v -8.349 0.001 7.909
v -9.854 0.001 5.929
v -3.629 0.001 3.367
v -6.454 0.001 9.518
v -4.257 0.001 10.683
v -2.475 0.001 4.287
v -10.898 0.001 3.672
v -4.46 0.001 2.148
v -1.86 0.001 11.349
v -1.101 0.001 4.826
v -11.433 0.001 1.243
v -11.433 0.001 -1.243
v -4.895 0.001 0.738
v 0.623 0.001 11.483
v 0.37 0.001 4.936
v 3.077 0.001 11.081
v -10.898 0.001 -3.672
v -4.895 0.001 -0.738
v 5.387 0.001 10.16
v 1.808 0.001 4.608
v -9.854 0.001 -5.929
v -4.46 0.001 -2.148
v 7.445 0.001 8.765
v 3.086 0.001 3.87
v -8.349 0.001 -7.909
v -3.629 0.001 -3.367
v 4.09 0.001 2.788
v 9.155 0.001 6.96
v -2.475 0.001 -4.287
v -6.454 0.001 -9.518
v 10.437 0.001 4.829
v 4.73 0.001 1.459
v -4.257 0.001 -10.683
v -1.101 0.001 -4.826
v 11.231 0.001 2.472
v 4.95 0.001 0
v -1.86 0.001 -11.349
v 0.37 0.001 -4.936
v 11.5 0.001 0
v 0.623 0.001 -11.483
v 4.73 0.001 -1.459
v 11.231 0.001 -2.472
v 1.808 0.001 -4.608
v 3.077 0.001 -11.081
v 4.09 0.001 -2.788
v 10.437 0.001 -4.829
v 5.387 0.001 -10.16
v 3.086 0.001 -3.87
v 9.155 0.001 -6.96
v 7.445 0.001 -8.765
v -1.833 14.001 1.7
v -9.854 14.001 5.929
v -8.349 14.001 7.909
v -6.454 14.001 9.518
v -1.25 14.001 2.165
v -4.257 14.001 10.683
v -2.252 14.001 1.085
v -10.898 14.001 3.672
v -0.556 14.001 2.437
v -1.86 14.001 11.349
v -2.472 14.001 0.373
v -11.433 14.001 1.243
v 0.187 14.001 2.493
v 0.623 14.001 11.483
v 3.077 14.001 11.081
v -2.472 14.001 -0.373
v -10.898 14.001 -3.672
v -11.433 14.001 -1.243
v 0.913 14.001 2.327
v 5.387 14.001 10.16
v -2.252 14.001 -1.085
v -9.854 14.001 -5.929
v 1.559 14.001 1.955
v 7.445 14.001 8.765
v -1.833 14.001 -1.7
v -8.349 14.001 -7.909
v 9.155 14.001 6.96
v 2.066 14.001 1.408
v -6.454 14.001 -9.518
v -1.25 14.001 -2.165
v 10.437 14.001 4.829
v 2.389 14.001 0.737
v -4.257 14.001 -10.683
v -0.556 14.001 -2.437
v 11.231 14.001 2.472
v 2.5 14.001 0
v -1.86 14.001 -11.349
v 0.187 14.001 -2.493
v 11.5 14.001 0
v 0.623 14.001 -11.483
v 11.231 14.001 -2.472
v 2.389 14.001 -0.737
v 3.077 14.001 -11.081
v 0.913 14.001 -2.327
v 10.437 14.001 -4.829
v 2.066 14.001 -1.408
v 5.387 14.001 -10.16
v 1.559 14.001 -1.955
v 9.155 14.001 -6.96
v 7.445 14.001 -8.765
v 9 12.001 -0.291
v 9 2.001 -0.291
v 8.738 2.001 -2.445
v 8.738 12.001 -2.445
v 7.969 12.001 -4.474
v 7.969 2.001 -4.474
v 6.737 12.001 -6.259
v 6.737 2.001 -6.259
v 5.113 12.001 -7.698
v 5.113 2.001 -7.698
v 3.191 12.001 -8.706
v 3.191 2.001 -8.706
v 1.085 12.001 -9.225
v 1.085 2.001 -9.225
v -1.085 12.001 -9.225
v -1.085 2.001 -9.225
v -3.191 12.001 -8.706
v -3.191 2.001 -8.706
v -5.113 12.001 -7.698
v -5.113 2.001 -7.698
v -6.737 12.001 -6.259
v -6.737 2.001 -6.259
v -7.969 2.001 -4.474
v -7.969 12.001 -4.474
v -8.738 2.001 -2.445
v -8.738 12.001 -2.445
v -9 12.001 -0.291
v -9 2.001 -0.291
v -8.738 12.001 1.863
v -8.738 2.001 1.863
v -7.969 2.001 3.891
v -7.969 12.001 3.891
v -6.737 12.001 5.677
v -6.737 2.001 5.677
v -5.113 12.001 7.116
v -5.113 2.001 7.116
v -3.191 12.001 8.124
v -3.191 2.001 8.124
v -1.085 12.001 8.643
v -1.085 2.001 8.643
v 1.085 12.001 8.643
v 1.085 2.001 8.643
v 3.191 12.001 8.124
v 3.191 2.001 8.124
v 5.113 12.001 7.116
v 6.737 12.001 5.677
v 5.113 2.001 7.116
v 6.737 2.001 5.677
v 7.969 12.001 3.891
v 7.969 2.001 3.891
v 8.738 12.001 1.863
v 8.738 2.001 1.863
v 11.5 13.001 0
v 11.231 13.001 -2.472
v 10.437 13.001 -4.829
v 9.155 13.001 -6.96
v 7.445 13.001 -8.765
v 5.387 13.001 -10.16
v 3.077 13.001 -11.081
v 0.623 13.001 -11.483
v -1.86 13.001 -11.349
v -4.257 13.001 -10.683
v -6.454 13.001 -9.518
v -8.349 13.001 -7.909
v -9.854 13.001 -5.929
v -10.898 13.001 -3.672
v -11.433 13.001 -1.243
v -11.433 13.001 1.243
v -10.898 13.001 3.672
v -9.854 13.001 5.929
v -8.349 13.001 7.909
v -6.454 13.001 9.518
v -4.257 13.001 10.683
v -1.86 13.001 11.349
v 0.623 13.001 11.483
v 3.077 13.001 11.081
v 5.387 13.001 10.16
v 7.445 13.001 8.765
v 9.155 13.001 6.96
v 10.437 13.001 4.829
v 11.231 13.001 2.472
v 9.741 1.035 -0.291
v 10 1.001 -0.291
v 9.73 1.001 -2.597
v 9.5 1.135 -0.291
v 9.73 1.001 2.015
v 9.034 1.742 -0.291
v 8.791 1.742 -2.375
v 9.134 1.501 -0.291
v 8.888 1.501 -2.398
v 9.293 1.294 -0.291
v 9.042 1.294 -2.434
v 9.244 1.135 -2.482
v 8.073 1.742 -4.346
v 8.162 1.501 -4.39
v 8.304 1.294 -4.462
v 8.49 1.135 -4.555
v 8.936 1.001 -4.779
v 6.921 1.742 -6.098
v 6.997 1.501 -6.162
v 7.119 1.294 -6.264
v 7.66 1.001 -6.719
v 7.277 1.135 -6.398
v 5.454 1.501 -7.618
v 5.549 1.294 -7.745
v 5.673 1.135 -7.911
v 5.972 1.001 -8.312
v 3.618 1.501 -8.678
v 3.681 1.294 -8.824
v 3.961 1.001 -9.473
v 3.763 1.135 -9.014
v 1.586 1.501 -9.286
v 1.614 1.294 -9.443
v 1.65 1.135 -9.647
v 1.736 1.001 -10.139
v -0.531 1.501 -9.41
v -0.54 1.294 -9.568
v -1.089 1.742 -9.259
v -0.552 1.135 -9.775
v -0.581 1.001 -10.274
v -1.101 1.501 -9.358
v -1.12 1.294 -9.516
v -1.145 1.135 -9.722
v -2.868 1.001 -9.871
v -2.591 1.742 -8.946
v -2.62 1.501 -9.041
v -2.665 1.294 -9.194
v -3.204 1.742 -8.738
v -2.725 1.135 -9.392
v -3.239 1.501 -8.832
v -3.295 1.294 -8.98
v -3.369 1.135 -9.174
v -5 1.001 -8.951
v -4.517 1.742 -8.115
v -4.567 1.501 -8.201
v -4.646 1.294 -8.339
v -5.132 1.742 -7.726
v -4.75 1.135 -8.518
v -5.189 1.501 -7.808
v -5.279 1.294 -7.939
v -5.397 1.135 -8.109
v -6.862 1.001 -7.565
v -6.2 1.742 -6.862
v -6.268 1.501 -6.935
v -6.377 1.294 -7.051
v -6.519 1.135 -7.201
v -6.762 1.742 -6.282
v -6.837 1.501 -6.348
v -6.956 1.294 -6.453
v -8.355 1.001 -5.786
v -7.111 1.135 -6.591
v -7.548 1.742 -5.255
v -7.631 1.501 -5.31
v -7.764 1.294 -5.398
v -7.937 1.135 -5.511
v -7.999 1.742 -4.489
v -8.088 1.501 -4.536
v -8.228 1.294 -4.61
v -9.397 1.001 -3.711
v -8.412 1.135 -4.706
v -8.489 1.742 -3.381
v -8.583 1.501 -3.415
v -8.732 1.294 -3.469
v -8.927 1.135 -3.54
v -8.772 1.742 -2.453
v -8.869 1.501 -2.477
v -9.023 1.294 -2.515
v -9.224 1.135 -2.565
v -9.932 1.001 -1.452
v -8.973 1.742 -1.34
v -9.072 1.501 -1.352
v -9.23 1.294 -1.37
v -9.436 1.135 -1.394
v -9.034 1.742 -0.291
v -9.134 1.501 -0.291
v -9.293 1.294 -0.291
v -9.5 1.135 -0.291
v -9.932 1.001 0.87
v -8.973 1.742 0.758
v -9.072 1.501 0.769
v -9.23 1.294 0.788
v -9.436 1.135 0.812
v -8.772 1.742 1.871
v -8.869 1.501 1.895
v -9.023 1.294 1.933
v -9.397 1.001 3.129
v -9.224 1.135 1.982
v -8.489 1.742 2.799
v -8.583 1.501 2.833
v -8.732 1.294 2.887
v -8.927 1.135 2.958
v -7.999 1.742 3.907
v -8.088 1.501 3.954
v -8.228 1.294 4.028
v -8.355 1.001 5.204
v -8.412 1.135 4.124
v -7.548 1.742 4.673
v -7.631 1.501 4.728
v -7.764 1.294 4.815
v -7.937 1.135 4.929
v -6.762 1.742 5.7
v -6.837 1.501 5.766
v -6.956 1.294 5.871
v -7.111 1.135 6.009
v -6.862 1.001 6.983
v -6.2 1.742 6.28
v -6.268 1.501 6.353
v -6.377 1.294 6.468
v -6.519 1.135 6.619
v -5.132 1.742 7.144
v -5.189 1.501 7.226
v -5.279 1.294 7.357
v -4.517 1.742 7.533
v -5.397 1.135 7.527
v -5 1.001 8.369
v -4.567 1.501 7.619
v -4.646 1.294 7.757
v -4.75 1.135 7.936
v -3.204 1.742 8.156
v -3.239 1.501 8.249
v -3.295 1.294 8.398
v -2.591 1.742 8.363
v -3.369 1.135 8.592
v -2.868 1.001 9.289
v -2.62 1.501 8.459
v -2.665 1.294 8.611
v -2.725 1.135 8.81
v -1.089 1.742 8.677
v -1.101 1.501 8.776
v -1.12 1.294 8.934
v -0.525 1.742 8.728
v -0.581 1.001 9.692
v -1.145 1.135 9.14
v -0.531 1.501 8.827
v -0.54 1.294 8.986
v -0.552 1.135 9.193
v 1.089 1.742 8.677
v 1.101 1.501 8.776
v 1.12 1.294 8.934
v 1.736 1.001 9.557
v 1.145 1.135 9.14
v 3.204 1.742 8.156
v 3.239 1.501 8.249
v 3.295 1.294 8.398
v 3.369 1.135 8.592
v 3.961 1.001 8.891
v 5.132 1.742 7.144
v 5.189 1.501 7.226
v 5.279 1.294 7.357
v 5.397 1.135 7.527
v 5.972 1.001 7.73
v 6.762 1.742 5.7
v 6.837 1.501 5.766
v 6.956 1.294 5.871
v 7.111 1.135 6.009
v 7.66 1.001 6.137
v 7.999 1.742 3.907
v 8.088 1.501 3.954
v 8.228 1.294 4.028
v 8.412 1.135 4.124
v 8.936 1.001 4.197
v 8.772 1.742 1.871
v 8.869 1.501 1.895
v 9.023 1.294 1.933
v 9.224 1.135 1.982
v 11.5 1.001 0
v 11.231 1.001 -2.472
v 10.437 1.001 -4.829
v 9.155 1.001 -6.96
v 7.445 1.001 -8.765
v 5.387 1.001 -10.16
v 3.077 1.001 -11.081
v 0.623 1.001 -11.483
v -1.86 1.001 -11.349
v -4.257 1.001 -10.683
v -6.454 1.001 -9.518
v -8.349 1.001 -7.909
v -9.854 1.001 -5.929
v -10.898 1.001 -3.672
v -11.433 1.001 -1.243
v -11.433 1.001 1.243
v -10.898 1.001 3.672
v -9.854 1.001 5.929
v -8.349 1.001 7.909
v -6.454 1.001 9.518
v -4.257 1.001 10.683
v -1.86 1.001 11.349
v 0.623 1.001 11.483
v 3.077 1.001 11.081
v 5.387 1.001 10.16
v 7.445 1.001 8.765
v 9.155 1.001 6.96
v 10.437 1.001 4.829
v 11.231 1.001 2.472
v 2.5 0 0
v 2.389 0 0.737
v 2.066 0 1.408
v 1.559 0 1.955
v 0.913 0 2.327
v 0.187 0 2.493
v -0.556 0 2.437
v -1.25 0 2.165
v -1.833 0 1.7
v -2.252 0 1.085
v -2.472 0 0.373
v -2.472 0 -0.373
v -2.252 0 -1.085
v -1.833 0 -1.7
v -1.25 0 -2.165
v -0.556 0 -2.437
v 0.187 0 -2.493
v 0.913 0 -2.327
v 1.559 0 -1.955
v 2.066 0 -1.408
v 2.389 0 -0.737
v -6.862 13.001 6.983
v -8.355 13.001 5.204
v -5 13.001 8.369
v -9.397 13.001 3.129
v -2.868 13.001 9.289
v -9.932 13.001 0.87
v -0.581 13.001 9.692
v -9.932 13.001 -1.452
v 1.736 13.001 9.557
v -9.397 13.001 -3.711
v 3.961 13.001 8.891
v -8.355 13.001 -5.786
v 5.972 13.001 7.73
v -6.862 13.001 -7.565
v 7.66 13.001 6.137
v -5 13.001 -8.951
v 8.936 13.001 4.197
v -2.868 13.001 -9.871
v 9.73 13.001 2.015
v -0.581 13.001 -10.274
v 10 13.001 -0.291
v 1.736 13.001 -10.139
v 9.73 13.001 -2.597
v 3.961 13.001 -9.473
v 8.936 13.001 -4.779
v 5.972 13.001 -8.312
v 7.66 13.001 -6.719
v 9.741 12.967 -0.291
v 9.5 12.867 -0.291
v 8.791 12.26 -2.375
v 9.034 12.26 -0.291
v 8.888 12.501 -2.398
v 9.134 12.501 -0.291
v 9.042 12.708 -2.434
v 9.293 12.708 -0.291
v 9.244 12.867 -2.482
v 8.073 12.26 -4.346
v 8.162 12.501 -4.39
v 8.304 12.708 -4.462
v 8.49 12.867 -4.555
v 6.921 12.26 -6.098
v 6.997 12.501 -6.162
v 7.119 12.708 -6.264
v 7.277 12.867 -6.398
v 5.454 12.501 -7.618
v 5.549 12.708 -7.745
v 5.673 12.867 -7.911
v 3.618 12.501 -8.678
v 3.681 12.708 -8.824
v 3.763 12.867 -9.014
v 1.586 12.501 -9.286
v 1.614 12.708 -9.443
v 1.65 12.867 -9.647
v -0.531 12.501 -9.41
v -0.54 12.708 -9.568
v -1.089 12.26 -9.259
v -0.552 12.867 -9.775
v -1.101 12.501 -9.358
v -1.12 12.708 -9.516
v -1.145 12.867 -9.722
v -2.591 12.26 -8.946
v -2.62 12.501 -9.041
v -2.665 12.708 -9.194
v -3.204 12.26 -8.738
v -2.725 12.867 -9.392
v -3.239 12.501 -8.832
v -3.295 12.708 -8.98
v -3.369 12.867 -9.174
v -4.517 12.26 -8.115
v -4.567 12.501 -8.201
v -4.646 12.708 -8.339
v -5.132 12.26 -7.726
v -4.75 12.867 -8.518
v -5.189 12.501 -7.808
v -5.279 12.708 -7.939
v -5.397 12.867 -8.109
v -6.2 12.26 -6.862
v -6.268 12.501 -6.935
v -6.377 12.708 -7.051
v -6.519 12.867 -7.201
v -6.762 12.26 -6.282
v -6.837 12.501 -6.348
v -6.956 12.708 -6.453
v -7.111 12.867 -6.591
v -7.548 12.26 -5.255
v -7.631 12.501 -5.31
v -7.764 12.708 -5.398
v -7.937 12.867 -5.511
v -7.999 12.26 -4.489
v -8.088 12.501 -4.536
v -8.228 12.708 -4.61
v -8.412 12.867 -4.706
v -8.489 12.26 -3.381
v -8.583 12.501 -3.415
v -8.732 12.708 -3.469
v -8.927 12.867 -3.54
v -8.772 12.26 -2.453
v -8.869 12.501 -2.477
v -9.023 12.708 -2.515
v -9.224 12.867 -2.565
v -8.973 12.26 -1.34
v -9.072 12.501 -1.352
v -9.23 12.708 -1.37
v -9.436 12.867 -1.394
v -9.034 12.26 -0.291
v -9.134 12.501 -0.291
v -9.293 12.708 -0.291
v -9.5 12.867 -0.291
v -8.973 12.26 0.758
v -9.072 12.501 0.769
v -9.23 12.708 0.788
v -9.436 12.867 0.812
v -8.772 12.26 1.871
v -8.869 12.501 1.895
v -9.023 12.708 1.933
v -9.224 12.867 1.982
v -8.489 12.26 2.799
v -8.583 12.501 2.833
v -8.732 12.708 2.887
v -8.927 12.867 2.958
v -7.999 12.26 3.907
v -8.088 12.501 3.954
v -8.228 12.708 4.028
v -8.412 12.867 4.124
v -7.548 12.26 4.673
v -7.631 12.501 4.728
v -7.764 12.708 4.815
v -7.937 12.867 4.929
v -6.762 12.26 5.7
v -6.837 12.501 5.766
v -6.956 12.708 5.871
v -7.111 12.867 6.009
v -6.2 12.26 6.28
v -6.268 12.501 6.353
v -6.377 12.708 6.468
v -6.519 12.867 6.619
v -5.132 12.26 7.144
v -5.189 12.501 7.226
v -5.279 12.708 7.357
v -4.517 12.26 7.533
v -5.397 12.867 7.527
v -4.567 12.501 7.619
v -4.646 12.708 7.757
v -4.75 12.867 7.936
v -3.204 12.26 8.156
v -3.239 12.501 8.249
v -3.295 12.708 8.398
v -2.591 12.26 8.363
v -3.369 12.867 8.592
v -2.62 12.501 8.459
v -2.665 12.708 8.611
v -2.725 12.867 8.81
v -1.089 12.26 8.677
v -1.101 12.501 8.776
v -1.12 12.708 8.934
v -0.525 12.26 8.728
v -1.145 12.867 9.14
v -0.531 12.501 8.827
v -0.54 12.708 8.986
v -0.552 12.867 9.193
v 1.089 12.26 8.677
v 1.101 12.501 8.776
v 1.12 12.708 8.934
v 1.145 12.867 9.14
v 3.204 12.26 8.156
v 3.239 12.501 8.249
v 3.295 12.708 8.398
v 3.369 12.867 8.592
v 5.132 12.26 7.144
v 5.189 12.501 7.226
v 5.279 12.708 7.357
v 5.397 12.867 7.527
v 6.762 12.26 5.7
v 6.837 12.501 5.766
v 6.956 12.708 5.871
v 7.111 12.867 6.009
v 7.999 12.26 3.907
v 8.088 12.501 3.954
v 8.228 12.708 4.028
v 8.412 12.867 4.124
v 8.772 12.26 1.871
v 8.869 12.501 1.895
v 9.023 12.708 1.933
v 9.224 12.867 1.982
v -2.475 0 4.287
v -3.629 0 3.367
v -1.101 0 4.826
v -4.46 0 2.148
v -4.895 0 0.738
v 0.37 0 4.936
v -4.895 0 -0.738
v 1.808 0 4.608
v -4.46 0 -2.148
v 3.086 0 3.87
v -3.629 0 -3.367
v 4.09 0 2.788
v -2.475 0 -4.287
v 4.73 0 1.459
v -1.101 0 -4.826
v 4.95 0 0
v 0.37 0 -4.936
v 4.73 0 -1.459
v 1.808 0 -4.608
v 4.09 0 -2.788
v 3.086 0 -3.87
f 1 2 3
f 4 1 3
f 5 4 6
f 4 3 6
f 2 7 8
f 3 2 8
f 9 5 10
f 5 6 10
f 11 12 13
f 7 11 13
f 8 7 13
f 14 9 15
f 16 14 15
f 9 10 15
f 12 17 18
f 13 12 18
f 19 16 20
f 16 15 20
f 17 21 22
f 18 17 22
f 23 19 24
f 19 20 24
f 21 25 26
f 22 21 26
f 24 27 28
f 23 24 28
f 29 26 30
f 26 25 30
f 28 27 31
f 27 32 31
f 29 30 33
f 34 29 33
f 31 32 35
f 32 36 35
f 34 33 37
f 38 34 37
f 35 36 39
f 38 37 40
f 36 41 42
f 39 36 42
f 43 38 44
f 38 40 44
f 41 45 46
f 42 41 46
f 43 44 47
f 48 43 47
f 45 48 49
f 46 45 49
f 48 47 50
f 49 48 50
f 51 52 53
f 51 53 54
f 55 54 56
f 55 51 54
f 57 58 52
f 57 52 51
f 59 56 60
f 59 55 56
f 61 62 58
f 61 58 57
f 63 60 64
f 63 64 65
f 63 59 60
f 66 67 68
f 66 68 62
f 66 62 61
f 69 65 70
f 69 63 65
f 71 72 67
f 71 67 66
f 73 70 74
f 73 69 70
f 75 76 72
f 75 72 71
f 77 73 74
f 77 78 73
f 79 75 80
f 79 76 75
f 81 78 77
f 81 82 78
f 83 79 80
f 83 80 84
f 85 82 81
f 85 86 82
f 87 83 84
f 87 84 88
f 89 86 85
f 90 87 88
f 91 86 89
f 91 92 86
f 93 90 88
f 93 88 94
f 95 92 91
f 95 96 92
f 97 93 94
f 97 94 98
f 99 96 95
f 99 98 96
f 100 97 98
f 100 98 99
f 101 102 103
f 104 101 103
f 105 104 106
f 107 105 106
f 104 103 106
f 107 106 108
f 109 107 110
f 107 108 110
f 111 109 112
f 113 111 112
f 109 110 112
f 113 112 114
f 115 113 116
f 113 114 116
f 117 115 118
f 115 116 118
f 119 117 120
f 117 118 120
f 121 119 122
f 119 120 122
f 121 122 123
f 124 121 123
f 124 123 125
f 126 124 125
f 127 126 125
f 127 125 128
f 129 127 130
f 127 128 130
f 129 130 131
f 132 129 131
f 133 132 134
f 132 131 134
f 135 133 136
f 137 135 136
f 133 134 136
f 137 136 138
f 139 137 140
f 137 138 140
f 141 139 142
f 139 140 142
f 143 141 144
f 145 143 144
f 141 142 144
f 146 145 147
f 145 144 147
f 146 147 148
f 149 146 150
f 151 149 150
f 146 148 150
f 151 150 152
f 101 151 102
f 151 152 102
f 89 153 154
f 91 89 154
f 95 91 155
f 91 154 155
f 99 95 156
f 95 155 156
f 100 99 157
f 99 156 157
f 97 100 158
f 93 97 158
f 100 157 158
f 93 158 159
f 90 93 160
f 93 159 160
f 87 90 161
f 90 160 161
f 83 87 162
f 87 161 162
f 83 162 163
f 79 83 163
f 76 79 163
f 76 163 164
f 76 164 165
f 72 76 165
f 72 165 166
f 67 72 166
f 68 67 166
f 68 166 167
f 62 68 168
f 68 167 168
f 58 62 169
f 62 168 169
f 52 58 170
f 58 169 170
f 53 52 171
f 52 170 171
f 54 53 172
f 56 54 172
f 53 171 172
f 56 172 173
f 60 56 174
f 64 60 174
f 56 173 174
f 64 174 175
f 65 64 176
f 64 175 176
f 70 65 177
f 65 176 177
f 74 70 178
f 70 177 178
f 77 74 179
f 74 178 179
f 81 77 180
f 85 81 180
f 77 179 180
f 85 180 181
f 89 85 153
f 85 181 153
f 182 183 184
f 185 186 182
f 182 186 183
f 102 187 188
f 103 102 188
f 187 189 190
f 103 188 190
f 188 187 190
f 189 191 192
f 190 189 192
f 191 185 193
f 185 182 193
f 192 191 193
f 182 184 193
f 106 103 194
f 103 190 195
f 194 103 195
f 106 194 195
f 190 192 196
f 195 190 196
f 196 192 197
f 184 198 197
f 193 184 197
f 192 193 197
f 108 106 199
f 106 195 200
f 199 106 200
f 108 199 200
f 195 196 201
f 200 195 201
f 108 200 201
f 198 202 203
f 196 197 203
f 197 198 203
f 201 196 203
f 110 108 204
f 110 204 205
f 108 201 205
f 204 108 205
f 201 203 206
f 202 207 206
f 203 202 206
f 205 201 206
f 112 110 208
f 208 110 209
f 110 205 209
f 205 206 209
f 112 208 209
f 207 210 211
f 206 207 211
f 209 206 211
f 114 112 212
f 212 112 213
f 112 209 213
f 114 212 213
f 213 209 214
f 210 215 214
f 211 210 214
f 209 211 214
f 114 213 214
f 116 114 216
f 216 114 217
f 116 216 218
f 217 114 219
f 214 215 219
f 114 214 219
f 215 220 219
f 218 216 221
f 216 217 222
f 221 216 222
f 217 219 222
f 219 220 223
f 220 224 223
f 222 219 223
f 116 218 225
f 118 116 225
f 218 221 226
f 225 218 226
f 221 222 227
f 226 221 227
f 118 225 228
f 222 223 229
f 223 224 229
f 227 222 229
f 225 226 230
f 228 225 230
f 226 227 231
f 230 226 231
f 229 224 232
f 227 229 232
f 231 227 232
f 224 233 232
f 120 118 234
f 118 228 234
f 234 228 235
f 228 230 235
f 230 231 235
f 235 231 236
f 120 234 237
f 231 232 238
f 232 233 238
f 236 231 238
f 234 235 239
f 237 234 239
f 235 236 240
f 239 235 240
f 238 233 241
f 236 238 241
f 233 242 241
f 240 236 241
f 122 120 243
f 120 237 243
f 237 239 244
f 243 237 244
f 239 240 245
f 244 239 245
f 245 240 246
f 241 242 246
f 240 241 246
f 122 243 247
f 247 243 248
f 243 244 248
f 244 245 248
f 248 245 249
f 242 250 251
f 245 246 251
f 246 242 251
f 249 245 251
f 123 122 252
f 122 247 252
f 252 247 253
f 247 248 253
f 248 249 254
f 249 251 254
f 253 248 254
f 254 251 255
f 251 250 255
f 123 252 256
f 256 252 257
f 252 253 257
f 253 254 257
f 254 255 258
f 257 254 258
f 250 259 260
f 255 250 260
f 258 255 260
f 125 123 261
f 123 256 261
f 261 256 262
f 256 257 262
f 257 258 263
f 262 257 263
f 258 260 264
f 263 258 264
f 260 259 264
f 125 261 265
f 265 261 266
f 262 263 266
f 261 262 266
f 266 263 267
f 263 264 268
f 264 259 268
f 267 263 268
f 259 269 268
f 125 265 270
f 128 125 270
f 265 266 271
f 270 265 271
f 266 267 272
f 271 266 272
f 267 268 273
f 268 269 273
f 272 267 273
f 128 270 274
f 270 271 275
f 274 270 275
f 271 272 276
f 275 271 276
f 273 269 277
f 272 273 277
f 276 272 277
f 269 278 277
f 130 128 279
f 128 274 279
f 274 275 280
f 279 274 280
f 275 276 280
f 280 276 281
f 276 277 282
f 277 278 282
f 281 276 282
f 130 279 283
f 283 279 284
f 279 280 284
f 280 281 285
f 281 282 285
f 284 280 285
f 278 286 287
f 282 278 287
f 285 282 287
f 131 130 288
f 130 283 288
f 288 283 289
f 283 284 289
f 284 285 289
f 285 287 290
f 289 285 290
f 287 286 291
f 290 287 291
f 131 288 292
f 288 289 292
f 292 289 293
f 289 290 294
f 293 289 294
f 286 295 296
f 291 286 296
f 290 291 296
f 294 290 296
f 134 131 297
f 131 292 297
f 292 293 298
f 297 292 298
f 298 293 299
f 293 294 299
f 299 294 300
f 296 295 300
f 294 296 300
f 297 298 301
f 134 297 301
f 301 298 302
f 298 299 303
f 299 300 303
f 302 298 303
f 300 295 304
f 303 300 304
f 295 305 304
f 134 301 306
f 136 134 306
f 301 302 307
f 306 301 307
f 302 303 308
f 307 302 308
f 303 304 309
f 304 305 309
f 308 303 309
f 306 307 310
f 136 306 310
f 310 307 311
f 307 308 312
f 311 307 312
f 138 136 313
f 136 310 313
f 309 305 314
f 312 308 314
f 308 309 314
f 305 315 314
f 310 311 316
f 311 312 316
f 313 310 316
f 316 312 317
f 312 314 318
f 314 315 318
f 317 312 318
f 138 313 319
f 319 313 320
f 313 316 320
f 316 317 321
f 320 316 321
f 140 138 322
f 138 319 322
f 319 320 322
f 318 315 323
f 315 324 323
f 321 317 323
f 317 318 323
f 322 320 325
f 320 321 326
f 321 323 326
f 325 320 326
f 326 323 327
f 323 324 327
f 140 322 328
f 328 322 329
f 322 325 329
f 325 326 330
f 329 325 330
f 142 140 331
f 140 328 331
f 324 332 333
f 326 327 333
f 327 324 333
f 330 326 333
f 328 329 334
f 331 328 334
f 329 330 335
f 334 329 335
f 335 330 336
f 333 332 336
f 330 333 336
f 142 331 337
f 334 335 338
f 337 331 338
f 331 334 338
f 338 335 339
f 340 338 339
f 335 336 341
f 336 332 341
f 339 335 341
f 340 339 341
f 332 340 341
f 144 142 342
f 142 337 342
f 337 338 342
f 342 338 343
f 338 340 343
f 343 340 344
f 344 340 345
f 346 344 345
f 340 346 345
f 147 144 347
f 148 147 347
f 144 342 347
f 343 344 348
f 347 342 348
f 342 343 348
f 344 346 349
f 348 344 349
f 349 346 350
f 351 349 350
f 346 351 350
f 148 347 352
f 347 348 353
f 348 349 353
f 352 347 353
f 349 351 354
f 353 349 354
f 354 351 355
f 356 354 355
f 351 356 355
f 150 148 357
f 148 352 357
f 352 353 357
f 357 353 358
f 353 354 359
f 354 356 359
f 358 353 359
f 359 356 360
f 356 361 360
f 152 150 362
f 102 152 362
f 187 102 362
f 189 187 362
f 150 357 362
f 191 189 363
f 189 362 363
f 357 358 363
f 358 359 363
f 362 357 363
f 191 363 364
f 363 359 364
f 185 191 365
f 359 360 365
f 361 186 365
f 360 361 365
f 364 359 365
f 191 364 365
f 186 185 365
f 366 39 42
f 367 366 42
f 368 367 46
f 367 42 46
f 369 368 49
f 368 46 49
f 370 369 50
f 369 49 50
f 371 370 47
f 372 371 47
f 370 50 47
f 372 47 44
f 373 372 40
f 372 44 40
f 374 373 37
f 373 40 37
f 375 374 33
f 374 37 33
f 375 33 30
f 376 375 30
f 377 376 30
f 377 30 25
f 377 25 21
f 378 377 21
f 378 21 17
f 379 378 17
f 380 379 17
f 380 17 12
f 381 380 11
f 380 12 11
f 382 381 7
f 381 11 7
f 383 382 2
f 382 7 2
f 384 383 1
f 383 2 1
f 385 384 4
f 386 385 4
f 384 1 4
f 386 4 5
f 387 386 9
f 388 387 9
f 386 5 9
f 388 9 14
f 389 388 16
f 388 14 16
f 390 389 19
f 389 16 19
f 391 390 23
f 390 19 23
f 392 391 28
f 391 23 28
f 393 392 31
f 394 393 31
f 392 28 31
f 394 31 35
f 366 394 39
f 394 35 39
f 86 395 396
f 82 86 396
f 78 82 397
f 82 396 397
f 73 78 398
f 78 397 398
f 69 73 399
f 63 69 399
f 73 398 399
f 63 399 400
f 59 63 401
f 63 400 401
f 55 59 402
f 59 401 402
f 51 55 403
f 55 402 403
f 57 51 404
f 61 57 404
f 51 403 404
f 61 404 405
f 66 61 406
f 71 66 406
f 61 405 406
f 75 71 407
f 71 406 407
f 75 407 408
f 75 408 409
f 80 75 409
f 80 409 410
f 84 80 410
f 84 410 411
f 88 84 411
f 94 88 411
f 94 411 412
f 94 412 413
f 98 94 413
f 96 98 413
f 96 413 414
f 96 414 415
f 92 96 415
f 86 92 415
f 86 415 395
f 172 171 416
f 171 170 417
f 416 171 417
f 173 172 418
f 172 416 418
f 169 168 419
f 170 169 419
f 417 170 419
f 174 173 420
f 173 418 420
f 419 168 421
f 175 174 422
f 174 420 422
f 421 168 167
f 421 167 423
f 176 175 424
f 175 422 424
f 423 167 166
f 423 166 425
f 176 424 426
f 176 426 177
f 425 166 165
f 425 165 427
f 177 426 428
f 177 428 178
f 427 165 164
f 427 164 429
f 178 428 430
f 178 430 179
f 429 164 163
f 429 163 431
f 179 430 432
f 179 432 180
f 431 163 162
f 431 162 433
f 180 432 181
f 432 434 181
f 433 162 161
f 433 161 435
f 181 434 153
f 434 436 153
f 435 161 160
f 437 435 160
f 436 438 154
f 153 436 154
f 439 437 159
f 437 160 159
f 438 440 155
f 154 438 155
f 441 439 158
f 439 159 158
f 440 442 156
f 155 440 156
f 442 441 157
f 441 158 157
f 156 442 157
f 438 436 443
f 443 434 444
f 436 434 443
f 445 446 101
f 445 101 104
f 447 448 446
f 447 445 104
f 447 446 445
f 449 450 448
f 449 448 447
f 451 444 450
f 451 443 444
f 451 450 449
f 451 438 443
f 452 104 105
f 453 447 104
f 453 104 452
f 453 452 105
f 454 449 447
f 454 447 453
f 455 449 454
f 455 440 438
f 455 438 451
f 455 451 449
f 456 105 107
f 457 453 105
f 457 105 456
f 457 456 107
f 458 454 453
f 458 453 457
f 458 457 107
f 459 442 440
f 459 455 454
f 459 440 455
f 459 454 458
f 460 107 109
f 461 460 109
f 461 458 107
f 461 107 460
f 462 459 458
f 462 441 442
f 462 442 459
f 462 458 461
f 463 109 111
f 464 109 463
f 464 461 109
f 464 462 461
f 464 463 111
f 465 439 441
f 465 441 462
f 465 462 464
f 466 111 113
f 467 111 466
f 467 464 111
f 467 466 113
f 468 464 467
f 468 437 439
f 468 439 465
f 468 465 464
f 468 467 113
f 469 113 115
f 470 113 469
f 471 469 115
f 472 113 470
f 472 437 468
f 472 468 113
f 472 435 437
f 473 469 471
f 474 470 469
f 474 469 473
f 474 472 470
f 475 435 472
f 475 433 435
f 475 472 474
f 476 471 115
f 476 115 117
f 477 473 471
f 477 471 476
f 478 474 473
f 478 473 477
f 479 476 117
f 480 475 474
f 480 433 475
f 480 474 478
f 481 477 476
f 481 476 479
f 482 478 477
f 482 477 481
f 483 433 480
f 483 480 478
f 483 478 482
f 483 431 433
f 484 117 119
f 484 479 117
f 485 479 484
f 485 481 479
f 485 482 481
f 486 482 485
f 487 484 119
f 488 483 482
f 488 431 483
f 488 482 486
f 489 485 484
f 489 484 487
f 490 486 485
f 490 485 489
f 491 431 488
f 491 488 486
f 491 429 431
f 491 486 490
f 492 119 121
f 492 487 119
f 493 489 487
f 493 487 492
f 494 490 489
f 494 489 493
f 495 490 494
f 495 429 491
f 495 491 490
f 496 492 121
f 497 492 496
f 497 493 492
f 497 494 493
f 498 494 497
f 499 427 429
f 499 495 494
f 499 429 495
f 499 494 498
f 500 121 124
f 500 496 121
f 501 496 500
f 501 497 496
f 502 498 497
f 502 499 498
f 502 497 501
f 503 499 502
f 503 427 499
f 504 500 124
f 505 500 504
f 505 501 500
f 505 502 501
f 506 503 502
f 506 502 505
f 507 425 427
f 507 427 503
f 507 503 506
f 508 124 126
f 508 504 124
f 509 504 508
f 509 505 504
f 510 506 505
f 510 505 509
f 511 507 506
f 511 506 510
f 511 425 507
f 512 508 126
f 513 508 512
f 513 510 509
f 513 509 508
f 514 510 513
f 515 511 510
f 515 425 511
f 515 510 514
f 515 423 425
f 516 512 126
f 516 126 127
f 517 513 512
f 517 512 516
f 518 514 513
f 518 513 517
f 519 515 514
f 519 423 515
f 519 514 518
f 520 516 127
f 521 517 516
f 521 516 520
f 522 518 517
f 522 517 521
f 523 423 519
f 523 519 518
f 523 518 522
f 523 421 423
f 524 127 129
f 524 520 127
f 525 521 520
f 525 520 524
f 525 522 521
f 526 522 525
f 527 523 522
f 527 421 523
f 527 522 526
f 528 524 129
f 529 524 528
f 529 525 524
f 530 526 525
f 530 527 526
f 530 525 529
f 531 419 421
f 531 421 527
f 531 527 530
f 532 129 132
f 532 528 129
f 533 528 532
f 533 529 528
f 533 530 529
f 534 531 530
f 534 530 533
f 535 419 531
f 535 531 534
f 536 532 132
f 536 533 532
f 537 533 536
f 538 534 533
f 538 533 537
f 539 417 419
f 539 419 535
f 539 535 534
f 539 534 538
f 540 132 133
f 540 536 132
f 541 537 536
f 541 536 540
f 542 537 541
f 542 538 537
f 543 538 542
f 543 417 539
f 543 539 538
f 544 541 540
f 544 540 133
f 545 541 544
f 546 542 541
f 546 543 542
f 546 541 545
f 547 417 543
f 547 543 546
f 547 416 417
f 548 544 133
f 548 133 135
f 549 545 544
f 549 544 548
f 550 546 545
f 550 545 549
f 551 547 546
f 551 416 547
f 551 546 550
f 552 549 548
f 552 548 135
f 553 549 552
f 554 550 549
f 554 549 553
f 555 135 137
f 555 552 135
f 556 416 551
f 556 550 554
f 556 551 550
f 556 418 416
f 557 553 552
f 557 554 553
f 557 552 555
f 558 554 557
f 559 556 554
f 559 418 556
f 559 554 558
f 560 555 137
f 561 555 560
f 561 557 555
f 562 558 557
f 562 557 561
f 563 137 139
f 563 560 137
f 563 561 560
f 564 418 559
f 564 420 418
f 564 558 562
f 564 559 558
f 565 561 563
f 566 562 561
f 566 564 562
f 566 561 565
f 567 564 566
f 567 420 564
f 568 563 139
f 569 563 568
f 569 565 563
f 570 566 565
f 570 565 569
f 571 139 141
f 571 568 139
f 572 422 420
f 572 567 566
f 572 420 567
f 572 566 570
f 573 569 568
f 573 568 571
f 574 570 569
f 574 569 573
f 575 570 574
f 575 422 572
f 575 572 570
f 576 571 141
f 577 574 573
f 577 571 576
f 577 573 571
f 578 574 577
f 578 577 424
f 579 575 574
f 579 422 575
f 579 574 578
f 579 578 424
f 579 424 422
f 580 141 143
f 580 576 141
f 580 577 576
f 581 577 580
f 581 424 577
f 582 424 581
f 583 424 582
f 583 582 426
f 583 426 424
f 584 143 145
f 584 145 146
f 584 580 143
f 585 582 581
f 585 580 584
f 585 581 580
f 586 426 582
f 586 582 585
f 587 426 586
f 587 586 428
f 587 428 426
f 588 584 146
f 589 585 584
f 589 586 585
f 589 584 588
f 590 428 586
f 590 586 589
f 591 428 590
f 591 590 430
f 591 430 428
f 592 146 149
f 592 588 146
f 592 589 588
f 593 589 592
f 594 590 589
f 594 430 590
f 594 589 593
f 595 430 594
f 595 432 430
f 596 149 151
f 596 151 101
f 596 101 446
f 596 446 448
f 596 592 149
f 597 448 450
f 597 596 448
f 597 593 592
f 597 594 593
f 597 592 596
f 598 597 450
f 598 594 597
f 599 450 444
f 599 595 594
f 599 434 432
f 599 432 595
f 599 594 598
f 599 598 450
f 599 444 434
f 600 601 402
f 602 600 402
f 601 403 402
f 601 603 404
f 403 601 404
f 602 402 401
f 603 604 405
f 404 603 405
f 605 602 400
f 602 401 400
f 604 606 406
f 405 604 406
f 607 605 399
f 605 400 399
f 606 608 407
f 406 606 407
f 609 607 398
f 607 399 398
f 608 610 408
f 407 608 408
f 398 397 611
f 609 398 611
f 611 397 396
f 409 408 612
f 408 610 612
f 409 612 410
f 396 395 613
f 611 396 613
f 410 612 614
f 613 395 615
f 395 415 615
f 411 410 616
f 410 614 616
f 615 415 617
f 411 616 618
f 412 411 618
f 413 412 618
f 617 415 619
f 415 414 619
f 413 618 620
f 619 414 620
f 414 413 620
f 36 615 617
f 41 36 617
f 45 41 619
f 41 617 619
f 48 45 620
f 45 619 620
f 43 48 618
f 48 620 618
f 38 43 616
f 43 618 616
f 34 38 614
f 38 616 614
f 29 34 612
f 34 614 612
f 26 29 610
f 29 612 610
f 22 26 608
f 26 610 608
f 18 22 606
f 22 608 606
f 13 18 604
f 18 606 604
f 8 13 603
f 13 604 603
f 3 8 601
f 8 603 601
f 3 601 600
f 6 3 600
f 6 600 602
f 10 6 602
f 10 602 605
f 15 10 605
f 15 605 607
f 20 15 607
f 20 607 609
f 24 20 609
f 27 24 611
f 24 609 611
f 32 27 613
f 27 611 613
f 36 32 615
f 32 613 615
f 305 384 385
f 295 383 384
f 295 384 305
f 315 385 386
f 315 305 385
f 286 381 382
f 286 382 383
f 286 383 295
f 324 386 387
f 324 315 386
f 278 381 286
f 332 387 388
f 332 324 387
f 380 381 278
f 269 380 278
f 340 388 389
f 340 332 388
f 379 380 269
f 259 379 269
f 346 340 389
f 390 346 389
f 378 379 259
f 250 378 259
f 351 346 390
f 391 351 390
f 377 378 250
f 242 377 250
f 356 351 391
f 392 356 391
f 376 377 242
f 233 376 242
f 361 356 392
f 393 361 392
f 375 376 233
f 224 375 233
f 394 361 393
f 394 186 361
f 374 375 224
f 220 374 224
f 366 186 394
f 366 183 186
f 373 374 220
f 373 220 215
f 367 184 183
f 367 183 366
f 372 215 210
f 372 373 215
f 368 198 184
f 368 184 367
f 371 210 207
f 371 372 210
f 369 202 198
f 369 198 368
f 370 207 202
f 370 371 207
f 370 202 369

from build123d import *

# Parameters (mm, degrees)
SKETCH1_R           = 4.95
BOSS_EXTRUDE2_DEPTH = 0.001
SKETCH4_R           = 11.5
BOSS_EXTRUDE3_DEPTH = 1
SKETCH5_R           = 9
BOSS_EXTRUDE4_DEPTH = 12
SKETCH6_R           = 11.5
BOSS_EXTRUDE5_DEPTH = 1
FILLET1_R           = 1
FILLET2_R           = 1
SKETCH7_R           = 2.5
CUT_EXTRUDE1_DEPTH  = 15.001


with BuildPart() as part:
    # Sketch1 → Boss-Extrude2 (new body)
    with BuildSketch(Plane(origin=(0, 0, 0), x_dir=(1, 0, 0), z_dir=(0, 1, 0))):
        Circle(SKETCH1_R)
    extrude(amount=BOSS_EXTRUDE2_DEPTH)

    # Sketch4 → Boss-Extrude3 (add)
    with BuildSketch(Plane(origin=(0, 0.001, 0), x_dir=(1, 0, 0), z_dir=(0, 1, 0))):
        Circle(SKETCH4_R)
    extrude(amount=BOSS_EXTRUDE3_DEPTH)

    # Sketch5 → Boss-Extrude4 (add)
    with BuildSketch(Plane(origin=(0, 1.001, 0), x_dir=(1, 0, 0), z_dir=(0, 1, 0))):
        with Locations((0, 0.291114712)):
            Circle(SKETCH5_R)
    extrude(amount=BOSS_EXTRUDE4_DEPTH)

    # Sketch6 → Boss-Extrude5 (add)
    with BuildSketch(Plane(origin=(0, 13.001, 0), x_dir=(1, 0, 0), z_dir=(0, 1, 0))):
        Circle(SKETCH6_R)
    extrude(amount=BOSS_EXTRUDE5_DEPTH)

    # Fillet1
    fillet1_edges = [part.edges().sort_by_distance(p)[0] for p in [
        (-9, 1.001, -0.291114712),
    ]]
    fillet(fillet1_edges, radius=FILLET1_R)

    # Fillet2
    fillet2_edges = [part.edges().sort_by_distance(p)[0] for p in [
        (-9, 13.001, -0.291114712),
    ]]
    fillet(fillet2_edges, radius=FILLET2_R)

    # Sketch7 → Cut-Extrude1 (cut, through all)
    with BuildSketch(Plane.XZ):
        Circle(SKETCH7_R)
    extrude(amount=-CUT_EXTRUDE1_DEPTH, mode=Mode.SUBTRACT)


solid = part.part
